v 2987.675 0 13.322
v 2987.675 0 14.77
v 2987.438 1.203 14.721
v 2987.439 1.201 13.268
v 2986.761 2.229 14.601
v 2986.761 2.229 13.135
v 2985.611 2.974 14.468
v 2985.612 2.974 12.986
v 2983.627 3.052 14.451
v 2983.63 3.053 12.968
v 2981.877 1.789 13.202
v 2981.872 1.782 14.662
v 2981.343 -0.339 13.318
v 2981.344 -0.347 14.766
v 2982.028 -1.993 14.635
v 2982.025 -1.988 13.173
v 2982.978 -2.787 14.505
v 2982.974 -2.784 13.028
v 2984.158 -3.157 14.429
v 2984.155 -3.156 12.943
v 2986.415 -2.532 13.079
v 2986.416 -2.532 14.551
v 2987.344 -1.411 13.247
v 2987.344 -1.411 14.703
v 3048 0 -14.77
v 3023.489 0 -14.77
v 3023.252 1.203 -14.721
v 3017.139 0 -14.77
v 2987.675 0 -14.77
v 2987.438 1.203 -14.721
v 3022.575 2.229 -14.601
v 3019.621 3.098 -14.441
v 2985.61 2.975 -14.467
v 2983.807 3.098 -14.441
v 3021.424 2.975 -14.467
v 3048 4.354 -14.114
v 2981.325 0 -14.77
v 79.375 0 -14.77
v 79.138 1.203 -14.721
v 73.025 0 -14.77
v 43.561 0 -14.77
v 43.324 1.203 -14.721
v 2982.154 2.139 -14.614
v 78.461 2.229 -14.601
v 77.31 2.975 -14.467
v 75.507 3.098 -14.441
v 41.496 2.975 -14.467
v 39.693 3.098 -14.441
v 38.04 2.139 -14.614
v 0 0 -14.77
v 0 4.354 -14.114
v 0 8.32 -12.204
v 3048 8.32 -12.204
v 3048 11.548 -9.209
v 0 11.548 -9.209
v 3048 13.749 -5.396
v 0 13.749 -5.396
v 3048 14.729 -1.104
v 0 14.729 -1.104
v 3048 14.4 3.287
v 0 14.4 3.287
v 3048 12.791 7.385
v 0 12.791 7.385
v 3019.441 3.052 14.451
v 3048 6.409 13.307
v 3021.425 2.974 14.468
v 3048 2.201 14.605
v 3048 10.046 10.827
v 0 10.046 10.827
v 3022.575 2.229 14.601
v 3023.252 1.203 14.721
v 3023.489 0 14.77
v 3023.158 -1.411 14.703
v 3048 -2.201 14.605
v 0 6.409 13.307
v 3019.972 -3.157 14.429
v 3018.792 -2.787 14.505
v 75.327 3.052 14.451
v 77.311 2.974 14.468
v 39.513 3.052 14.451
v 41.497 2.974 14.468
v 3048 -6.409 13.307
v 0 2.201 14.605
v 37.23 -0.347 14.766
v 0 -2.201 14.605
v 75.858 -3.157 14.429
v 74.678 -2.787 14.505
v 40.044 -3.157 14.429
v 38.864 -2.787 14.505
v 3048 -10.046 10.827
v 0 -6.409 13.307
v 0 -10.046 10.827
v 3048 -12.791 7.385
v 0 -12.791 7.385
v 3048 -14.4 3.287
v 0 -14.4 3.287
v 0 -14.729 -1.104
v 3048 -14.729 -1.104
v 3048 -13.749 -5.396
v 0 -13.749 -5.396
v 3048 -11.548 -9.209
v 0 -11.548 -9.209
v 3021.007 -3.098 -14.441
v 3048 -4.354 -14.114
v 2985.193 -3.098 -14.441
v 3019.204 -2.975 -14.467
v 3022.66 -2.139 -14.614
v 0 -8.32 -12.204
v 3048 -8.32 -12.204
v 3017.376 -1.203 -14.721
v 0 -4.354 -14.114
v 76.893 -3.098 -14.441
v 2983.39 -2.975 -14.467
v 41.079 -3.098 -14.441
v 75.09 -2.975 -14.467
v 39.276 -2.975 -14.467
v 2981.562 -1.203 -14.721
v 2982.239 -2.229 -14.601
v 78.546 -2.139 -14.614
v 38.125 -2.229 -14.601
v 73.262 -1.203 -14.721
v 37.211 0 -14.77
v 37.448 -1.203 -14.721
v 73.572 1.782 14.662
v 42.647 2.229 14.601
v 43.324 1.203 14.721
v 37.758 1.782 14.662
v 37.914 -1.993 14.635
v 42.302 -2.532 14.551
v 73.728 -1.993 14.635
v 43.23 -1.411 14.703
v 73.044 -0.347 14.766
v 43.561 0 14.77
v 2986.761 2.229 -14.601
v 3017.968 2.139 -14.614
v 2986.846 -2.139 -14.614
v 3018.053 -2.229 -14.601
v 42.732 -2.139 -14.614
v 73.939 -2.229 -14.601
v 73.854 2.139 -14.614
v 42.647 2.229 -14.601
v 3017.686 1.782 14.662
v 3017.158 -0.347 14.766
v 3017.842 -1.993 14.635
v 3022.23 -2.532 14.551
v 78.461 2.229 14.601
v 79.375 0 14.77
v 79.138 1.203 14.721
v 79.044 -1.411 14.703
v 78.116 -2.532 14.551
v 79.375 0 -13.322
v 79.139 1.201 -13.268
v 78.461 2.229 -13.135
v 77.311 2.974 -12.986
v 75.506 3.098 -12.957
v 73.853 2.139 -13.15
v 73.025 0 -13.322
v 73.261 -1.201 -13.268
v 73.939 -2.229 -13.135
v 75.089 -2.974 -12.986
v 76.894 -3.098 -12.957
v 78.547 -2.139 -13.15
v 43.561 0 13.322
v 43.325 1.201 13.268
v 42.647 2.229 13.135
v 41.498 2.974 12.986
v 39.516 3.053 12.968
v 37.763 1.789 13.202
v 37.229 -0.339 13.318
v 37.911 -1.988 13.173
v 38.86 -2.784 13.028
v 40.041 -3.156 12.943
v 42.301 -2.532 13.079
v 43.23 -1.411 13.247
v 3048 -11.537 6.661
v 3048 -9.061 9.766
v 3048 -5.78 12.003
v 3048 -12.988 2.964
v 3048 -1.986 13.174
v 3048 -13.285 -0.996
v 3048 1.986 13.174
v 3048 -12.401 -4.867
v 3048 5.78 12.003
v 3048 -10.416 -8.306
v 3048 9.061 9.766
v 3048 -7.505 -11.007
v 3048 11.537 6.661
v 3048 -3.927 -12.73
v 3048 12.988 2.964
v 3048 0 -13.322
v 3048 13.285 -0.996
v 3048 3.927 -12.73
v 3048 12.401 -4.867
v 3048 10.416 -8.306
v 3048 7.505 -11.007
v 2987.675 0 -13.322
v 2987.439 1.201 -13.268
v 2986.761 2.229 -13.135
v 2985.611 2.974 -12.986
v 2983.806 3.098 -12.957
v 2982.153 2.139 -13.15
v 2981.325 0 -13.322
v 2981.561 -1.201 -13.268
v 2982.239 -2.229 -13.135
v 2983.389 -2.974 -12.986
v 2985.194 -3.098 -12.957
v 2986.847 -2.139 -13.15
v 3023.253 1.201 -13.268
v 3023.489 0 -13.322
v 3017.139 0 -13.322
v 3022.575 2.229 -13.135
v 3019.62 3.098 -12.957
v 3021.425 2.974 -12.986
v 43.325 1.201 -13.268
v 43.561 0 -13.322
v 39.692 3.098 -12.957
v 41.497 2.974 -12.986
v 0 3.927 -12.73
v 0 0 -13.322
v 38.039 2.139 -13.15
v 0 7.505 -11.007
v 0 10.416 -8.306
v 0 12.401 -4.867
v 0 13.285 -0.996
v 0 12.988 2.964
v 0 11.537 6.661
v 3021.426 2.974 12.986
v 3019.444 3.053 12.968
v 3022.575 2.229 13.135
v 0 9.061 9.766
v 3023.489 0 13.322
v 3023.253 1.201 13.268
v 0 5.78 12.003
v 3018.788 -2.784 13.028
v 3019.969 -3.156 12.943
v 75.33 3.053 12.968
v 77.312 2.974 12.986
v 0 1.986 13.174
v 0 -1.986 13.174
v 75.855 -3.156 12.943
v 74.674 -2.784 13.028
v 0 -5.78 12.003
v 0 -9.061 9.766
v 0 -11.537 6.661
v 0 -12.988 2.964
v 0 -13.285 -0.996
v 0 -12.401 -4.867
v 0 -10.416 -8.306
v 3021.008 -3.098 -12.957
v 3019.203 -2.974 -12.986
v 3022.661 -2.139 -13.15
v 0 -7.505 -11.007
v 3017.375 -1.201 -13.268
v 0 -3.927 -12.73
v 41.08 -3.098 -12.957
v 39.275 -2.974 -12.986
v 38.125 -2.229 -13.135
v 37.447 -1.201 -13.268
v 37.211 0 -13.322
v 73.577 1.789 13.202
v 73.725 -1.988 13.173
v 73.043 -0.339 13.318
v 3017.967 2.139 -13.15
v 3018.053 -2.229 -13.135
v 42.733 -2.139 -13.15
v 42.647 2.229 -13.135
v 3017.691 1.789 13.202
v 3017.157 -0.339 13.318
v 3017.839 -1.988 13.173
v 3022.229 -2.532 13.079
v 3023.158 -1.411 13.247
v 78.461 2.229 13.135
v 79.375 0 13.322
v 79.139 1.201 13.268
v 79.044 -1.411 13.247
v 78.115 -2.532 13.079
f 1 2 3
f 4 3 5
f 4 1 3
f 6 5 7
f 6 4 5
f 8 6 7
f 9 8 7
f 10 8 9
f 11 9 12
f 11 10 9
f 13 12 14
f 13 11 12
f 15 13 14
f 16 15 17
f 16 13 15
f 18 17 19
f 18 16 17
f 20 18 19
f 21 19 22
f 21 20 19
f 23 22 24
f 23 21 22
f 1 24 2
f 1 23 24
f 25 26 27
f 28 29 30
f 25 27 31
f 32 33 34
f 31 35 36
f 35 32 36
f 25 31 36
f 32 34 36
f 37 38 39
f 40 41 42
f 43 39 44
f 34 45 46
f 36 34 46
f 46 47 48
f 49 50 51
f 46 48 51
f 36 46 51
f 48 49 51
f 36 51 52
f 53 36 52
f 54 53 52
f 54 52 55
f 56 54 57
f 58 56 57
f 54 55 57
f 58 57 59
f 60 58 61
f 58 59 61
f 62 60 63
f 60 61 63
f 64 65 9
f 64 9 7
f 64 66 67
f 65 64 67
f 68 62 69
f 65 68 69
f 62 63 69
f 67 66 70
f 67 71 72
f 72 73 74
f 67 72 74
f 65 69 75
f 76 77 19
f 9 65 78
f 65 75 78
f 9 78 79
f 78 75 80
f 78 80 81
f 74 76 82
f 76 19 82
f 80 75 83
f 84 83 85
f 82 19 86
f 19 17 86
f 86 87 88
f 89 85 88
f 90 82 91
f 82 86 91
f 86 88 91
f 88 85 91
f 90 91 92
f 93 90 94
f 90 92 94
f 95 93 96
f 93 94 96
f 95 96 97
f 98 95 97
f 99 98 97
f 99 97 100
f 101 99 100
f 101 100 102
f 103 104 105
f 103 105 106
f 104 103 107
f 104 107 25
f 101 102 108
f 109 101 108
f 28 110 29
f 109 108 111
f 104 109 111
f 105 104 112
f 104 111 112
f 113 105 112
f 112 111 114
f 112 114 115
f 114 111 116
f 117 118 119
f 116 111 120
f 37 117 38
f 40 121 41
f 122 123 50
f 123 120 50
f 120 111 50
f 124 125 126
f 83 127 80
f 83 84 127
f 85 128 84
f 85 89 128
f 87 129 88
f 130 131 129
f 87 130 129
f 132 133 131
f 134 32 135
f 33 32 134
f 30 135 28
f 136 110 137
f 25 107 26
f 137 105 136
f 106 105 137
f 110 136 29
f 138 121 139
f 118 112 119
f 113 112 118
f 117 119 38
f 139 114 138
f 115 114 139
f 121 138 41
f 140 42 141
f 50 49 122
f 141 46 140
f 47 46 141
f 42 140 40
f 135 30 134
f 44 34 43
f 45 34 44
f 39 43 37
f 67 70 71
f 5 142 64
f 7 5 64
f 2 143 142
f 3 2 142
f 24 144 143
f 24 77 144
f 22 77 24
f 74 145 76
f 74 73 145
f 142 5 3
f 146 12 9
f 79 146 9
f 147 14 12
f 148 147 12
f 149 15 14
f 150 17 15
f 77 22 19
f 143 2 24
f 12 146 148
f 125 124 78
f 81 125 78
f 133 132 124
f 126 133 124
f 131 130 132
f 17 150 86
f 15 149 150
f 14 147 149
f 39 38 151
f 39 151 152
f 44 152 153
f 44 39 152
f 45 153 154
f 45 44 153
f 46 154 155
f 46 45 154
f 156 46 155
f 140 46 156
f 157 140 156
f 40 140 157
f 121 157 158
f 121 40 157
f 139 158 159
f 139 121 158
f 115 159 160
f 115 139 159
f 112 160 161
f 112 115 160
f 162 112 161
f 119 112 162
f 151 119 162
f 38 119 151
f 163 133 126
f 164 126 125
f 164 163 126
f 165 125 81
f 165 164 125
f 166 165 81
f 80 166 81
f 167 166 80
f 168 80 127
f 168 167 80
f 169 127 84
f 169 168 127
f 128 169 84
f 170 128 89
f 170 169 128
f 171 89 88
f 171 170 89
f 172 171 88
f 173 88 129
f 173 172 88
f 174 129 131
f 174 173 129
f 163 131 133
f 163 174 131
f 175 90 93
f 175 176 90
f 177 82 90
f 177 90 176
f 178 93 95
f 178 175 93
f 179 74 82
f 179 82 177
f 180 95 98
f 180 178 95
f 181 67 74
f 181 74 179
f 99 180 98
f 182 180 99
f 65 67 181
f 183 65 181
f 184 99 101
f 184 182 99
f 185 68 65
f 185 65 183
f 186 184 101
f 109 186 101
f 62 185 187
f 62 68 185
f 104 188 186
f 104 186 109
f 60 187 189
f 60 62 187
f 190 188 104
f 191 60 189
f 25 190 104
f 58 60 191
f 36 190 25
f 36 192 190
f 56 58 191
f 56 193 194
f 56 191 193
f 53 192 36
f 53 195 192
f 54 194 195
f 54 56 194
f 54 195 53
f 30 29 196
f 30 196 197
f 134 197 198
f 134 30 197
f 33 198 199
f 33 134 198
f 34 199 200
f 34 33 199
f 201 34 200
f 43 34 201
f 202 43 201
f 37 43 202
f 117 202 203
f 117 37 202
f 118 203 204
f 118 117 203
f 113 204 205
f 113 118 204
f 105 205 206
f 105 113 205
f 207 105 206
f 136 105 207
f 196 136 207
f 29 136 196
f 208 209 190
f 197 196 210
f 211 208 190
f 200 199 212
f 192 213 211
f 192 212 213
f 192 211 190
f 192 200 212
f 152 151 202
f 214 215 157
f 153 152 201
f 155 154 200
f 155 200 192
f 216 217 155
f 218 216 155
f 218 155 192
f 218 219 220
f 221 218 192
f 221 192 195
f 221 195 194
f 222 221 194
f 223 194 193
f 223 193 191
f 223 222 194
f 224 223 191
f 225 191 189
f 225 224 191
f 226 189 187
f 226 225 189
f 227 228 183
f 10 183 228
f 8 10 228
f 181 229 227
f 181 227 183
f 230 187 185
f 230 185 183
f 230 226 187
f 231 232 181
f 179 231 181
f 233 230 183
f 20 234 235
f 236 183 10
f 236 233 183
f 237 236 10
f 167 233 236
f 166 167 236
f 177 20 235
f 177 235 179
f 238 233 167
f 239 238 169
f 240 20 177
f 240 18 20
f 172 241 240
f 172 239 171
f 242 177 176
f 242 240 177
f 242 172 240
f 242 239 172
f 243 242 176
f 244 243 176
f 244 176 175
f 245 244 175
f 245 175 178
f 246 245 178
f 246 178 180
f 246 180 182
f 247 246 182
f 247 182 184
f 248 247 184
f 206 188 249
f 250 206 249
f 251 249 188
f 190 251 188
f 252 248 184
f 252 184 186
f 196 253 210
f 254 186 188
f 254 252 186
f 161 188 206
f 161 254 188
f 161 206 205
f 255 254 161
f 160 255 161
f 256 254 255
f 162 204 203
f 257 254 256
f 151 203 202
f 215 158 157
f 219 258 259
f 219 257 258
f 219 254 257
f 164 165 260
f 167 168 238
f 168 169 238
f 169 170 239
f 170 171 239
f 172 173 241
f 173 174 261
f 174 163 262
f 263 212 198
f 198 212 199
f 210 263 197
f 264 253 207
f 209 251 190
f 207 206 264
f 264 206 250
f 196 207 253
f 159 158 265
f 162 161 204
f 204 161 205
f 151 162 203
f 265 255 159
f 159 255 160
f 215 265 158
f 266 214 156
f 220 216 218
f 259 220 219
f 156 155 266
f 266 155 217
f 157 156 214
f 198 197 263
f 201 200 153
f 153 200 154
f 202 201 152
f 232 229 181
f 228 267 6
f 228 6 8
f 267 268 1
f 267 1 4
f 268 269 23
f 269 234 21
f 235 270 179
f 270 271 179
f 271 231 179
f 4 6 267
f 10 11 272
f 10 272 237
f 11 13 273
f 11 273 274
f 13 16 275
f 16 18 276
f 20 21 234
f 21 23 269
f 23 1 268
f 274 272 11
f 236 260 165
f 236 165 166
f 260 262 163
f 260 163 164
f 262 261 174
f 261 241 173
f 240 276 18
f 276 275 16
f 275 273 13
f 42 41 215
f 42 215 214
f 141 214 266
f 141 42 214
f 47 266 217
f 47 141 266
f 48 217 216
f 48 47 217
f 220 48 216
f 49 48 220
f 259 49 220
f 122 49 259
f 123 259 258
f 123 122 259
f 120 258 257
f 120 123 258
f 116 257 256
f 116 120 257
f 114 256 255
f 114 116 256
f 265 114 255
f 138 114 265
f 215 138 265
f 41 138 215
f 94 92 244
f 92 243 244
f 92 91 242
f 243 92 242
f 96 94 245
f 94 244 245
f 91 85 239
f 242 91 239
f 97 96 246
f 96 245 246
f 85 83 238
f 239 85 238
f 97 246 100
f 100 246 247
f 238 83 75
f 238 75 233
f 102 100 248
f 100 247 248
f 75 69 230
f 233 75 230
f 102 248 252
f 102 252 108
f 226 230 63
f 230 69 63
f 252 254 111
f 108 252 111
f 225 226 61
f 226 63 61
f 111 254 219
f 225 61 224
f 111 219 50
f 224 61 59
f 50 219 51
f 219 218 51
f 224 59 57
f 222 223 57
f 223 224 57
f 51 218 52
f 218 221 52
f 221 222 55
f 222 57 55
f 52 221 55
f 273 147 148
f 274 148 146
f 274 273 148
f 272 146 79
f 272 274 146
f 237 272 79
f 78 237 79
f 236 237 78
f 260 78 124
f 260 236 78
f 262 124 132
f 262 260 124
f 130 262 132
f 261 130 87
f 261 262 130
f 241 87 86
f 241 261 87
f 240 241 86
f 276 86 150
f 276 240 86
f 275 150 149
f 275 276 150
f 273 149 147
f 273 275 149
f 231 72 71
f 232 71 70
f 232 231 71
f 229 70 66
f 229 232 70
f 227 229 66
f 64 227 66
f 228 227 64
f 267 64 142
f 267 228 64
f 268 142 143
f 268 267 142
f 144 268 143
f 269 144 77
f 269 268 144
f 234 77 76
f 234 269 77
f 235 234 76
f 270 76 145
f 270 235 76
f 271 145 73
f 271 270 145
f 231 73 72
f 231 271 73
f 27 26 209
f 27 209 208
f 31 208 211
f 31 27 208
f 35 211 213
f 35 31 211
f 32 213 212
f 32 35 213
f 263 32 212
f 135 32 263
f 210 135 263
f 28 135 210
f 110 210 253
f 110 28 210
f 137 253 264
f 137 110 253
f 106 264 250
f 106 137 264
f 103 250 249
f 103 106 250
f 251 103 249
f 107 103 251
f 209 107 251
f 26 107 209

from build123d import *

# Parameters (mm, degrees)
SKETCH3_R               = 14.7701
SKETCH3_R_2             = 13.3223
BOSS_EXTRUDE1_DEPTH     = 3048
CUT_EXTRUDE1_DEPTH      = 3049.071572603
CUT_EXTRUDE1_DEPTH_BACK = 3049.071572603
SKETCH4_R               = 3.175


with BuildPart() as part:
    # Sketch3 → Boss-Extrude1 (new body)
    with BuildSketch(Plane(origin=(0, 0, 0), x_dir=(0, 0, -1), z_dir=(1, 0, 0))):
        Circle(SKETCH3_R)
        Circle(SKETCH3_R_2, mode=Mode.SUBTRACT)
    extrude(amount=BOSS_EXTRUDE1_DEPTH)

    # Sketch4 → Cut-Extrude1 (cut, two sides: drawn at the far end of the back side and taken through both)
    with BuildSketch(Plane.XY.offset(-CUT_EXTRUDE1_DEPTH_BACK)):
        with Locations((40.386, 0)):
            Circle(SKETCH4_R)
        with Locations((76.2, 0)):
            Circle(SKETCH4_R)
        with Locations((3020.314, 0)):
            Circle(SKETCH4_R)
        with Locations((2984.5, 0)):
            Circle(SKETCH4_R)
    extrude(amount=CUT_EXTRUDE1_DEPTH + CUT_EXTRUDE1_DEPTH_BACK, mode=Mode.SUBTRACT)


solid = part.part
